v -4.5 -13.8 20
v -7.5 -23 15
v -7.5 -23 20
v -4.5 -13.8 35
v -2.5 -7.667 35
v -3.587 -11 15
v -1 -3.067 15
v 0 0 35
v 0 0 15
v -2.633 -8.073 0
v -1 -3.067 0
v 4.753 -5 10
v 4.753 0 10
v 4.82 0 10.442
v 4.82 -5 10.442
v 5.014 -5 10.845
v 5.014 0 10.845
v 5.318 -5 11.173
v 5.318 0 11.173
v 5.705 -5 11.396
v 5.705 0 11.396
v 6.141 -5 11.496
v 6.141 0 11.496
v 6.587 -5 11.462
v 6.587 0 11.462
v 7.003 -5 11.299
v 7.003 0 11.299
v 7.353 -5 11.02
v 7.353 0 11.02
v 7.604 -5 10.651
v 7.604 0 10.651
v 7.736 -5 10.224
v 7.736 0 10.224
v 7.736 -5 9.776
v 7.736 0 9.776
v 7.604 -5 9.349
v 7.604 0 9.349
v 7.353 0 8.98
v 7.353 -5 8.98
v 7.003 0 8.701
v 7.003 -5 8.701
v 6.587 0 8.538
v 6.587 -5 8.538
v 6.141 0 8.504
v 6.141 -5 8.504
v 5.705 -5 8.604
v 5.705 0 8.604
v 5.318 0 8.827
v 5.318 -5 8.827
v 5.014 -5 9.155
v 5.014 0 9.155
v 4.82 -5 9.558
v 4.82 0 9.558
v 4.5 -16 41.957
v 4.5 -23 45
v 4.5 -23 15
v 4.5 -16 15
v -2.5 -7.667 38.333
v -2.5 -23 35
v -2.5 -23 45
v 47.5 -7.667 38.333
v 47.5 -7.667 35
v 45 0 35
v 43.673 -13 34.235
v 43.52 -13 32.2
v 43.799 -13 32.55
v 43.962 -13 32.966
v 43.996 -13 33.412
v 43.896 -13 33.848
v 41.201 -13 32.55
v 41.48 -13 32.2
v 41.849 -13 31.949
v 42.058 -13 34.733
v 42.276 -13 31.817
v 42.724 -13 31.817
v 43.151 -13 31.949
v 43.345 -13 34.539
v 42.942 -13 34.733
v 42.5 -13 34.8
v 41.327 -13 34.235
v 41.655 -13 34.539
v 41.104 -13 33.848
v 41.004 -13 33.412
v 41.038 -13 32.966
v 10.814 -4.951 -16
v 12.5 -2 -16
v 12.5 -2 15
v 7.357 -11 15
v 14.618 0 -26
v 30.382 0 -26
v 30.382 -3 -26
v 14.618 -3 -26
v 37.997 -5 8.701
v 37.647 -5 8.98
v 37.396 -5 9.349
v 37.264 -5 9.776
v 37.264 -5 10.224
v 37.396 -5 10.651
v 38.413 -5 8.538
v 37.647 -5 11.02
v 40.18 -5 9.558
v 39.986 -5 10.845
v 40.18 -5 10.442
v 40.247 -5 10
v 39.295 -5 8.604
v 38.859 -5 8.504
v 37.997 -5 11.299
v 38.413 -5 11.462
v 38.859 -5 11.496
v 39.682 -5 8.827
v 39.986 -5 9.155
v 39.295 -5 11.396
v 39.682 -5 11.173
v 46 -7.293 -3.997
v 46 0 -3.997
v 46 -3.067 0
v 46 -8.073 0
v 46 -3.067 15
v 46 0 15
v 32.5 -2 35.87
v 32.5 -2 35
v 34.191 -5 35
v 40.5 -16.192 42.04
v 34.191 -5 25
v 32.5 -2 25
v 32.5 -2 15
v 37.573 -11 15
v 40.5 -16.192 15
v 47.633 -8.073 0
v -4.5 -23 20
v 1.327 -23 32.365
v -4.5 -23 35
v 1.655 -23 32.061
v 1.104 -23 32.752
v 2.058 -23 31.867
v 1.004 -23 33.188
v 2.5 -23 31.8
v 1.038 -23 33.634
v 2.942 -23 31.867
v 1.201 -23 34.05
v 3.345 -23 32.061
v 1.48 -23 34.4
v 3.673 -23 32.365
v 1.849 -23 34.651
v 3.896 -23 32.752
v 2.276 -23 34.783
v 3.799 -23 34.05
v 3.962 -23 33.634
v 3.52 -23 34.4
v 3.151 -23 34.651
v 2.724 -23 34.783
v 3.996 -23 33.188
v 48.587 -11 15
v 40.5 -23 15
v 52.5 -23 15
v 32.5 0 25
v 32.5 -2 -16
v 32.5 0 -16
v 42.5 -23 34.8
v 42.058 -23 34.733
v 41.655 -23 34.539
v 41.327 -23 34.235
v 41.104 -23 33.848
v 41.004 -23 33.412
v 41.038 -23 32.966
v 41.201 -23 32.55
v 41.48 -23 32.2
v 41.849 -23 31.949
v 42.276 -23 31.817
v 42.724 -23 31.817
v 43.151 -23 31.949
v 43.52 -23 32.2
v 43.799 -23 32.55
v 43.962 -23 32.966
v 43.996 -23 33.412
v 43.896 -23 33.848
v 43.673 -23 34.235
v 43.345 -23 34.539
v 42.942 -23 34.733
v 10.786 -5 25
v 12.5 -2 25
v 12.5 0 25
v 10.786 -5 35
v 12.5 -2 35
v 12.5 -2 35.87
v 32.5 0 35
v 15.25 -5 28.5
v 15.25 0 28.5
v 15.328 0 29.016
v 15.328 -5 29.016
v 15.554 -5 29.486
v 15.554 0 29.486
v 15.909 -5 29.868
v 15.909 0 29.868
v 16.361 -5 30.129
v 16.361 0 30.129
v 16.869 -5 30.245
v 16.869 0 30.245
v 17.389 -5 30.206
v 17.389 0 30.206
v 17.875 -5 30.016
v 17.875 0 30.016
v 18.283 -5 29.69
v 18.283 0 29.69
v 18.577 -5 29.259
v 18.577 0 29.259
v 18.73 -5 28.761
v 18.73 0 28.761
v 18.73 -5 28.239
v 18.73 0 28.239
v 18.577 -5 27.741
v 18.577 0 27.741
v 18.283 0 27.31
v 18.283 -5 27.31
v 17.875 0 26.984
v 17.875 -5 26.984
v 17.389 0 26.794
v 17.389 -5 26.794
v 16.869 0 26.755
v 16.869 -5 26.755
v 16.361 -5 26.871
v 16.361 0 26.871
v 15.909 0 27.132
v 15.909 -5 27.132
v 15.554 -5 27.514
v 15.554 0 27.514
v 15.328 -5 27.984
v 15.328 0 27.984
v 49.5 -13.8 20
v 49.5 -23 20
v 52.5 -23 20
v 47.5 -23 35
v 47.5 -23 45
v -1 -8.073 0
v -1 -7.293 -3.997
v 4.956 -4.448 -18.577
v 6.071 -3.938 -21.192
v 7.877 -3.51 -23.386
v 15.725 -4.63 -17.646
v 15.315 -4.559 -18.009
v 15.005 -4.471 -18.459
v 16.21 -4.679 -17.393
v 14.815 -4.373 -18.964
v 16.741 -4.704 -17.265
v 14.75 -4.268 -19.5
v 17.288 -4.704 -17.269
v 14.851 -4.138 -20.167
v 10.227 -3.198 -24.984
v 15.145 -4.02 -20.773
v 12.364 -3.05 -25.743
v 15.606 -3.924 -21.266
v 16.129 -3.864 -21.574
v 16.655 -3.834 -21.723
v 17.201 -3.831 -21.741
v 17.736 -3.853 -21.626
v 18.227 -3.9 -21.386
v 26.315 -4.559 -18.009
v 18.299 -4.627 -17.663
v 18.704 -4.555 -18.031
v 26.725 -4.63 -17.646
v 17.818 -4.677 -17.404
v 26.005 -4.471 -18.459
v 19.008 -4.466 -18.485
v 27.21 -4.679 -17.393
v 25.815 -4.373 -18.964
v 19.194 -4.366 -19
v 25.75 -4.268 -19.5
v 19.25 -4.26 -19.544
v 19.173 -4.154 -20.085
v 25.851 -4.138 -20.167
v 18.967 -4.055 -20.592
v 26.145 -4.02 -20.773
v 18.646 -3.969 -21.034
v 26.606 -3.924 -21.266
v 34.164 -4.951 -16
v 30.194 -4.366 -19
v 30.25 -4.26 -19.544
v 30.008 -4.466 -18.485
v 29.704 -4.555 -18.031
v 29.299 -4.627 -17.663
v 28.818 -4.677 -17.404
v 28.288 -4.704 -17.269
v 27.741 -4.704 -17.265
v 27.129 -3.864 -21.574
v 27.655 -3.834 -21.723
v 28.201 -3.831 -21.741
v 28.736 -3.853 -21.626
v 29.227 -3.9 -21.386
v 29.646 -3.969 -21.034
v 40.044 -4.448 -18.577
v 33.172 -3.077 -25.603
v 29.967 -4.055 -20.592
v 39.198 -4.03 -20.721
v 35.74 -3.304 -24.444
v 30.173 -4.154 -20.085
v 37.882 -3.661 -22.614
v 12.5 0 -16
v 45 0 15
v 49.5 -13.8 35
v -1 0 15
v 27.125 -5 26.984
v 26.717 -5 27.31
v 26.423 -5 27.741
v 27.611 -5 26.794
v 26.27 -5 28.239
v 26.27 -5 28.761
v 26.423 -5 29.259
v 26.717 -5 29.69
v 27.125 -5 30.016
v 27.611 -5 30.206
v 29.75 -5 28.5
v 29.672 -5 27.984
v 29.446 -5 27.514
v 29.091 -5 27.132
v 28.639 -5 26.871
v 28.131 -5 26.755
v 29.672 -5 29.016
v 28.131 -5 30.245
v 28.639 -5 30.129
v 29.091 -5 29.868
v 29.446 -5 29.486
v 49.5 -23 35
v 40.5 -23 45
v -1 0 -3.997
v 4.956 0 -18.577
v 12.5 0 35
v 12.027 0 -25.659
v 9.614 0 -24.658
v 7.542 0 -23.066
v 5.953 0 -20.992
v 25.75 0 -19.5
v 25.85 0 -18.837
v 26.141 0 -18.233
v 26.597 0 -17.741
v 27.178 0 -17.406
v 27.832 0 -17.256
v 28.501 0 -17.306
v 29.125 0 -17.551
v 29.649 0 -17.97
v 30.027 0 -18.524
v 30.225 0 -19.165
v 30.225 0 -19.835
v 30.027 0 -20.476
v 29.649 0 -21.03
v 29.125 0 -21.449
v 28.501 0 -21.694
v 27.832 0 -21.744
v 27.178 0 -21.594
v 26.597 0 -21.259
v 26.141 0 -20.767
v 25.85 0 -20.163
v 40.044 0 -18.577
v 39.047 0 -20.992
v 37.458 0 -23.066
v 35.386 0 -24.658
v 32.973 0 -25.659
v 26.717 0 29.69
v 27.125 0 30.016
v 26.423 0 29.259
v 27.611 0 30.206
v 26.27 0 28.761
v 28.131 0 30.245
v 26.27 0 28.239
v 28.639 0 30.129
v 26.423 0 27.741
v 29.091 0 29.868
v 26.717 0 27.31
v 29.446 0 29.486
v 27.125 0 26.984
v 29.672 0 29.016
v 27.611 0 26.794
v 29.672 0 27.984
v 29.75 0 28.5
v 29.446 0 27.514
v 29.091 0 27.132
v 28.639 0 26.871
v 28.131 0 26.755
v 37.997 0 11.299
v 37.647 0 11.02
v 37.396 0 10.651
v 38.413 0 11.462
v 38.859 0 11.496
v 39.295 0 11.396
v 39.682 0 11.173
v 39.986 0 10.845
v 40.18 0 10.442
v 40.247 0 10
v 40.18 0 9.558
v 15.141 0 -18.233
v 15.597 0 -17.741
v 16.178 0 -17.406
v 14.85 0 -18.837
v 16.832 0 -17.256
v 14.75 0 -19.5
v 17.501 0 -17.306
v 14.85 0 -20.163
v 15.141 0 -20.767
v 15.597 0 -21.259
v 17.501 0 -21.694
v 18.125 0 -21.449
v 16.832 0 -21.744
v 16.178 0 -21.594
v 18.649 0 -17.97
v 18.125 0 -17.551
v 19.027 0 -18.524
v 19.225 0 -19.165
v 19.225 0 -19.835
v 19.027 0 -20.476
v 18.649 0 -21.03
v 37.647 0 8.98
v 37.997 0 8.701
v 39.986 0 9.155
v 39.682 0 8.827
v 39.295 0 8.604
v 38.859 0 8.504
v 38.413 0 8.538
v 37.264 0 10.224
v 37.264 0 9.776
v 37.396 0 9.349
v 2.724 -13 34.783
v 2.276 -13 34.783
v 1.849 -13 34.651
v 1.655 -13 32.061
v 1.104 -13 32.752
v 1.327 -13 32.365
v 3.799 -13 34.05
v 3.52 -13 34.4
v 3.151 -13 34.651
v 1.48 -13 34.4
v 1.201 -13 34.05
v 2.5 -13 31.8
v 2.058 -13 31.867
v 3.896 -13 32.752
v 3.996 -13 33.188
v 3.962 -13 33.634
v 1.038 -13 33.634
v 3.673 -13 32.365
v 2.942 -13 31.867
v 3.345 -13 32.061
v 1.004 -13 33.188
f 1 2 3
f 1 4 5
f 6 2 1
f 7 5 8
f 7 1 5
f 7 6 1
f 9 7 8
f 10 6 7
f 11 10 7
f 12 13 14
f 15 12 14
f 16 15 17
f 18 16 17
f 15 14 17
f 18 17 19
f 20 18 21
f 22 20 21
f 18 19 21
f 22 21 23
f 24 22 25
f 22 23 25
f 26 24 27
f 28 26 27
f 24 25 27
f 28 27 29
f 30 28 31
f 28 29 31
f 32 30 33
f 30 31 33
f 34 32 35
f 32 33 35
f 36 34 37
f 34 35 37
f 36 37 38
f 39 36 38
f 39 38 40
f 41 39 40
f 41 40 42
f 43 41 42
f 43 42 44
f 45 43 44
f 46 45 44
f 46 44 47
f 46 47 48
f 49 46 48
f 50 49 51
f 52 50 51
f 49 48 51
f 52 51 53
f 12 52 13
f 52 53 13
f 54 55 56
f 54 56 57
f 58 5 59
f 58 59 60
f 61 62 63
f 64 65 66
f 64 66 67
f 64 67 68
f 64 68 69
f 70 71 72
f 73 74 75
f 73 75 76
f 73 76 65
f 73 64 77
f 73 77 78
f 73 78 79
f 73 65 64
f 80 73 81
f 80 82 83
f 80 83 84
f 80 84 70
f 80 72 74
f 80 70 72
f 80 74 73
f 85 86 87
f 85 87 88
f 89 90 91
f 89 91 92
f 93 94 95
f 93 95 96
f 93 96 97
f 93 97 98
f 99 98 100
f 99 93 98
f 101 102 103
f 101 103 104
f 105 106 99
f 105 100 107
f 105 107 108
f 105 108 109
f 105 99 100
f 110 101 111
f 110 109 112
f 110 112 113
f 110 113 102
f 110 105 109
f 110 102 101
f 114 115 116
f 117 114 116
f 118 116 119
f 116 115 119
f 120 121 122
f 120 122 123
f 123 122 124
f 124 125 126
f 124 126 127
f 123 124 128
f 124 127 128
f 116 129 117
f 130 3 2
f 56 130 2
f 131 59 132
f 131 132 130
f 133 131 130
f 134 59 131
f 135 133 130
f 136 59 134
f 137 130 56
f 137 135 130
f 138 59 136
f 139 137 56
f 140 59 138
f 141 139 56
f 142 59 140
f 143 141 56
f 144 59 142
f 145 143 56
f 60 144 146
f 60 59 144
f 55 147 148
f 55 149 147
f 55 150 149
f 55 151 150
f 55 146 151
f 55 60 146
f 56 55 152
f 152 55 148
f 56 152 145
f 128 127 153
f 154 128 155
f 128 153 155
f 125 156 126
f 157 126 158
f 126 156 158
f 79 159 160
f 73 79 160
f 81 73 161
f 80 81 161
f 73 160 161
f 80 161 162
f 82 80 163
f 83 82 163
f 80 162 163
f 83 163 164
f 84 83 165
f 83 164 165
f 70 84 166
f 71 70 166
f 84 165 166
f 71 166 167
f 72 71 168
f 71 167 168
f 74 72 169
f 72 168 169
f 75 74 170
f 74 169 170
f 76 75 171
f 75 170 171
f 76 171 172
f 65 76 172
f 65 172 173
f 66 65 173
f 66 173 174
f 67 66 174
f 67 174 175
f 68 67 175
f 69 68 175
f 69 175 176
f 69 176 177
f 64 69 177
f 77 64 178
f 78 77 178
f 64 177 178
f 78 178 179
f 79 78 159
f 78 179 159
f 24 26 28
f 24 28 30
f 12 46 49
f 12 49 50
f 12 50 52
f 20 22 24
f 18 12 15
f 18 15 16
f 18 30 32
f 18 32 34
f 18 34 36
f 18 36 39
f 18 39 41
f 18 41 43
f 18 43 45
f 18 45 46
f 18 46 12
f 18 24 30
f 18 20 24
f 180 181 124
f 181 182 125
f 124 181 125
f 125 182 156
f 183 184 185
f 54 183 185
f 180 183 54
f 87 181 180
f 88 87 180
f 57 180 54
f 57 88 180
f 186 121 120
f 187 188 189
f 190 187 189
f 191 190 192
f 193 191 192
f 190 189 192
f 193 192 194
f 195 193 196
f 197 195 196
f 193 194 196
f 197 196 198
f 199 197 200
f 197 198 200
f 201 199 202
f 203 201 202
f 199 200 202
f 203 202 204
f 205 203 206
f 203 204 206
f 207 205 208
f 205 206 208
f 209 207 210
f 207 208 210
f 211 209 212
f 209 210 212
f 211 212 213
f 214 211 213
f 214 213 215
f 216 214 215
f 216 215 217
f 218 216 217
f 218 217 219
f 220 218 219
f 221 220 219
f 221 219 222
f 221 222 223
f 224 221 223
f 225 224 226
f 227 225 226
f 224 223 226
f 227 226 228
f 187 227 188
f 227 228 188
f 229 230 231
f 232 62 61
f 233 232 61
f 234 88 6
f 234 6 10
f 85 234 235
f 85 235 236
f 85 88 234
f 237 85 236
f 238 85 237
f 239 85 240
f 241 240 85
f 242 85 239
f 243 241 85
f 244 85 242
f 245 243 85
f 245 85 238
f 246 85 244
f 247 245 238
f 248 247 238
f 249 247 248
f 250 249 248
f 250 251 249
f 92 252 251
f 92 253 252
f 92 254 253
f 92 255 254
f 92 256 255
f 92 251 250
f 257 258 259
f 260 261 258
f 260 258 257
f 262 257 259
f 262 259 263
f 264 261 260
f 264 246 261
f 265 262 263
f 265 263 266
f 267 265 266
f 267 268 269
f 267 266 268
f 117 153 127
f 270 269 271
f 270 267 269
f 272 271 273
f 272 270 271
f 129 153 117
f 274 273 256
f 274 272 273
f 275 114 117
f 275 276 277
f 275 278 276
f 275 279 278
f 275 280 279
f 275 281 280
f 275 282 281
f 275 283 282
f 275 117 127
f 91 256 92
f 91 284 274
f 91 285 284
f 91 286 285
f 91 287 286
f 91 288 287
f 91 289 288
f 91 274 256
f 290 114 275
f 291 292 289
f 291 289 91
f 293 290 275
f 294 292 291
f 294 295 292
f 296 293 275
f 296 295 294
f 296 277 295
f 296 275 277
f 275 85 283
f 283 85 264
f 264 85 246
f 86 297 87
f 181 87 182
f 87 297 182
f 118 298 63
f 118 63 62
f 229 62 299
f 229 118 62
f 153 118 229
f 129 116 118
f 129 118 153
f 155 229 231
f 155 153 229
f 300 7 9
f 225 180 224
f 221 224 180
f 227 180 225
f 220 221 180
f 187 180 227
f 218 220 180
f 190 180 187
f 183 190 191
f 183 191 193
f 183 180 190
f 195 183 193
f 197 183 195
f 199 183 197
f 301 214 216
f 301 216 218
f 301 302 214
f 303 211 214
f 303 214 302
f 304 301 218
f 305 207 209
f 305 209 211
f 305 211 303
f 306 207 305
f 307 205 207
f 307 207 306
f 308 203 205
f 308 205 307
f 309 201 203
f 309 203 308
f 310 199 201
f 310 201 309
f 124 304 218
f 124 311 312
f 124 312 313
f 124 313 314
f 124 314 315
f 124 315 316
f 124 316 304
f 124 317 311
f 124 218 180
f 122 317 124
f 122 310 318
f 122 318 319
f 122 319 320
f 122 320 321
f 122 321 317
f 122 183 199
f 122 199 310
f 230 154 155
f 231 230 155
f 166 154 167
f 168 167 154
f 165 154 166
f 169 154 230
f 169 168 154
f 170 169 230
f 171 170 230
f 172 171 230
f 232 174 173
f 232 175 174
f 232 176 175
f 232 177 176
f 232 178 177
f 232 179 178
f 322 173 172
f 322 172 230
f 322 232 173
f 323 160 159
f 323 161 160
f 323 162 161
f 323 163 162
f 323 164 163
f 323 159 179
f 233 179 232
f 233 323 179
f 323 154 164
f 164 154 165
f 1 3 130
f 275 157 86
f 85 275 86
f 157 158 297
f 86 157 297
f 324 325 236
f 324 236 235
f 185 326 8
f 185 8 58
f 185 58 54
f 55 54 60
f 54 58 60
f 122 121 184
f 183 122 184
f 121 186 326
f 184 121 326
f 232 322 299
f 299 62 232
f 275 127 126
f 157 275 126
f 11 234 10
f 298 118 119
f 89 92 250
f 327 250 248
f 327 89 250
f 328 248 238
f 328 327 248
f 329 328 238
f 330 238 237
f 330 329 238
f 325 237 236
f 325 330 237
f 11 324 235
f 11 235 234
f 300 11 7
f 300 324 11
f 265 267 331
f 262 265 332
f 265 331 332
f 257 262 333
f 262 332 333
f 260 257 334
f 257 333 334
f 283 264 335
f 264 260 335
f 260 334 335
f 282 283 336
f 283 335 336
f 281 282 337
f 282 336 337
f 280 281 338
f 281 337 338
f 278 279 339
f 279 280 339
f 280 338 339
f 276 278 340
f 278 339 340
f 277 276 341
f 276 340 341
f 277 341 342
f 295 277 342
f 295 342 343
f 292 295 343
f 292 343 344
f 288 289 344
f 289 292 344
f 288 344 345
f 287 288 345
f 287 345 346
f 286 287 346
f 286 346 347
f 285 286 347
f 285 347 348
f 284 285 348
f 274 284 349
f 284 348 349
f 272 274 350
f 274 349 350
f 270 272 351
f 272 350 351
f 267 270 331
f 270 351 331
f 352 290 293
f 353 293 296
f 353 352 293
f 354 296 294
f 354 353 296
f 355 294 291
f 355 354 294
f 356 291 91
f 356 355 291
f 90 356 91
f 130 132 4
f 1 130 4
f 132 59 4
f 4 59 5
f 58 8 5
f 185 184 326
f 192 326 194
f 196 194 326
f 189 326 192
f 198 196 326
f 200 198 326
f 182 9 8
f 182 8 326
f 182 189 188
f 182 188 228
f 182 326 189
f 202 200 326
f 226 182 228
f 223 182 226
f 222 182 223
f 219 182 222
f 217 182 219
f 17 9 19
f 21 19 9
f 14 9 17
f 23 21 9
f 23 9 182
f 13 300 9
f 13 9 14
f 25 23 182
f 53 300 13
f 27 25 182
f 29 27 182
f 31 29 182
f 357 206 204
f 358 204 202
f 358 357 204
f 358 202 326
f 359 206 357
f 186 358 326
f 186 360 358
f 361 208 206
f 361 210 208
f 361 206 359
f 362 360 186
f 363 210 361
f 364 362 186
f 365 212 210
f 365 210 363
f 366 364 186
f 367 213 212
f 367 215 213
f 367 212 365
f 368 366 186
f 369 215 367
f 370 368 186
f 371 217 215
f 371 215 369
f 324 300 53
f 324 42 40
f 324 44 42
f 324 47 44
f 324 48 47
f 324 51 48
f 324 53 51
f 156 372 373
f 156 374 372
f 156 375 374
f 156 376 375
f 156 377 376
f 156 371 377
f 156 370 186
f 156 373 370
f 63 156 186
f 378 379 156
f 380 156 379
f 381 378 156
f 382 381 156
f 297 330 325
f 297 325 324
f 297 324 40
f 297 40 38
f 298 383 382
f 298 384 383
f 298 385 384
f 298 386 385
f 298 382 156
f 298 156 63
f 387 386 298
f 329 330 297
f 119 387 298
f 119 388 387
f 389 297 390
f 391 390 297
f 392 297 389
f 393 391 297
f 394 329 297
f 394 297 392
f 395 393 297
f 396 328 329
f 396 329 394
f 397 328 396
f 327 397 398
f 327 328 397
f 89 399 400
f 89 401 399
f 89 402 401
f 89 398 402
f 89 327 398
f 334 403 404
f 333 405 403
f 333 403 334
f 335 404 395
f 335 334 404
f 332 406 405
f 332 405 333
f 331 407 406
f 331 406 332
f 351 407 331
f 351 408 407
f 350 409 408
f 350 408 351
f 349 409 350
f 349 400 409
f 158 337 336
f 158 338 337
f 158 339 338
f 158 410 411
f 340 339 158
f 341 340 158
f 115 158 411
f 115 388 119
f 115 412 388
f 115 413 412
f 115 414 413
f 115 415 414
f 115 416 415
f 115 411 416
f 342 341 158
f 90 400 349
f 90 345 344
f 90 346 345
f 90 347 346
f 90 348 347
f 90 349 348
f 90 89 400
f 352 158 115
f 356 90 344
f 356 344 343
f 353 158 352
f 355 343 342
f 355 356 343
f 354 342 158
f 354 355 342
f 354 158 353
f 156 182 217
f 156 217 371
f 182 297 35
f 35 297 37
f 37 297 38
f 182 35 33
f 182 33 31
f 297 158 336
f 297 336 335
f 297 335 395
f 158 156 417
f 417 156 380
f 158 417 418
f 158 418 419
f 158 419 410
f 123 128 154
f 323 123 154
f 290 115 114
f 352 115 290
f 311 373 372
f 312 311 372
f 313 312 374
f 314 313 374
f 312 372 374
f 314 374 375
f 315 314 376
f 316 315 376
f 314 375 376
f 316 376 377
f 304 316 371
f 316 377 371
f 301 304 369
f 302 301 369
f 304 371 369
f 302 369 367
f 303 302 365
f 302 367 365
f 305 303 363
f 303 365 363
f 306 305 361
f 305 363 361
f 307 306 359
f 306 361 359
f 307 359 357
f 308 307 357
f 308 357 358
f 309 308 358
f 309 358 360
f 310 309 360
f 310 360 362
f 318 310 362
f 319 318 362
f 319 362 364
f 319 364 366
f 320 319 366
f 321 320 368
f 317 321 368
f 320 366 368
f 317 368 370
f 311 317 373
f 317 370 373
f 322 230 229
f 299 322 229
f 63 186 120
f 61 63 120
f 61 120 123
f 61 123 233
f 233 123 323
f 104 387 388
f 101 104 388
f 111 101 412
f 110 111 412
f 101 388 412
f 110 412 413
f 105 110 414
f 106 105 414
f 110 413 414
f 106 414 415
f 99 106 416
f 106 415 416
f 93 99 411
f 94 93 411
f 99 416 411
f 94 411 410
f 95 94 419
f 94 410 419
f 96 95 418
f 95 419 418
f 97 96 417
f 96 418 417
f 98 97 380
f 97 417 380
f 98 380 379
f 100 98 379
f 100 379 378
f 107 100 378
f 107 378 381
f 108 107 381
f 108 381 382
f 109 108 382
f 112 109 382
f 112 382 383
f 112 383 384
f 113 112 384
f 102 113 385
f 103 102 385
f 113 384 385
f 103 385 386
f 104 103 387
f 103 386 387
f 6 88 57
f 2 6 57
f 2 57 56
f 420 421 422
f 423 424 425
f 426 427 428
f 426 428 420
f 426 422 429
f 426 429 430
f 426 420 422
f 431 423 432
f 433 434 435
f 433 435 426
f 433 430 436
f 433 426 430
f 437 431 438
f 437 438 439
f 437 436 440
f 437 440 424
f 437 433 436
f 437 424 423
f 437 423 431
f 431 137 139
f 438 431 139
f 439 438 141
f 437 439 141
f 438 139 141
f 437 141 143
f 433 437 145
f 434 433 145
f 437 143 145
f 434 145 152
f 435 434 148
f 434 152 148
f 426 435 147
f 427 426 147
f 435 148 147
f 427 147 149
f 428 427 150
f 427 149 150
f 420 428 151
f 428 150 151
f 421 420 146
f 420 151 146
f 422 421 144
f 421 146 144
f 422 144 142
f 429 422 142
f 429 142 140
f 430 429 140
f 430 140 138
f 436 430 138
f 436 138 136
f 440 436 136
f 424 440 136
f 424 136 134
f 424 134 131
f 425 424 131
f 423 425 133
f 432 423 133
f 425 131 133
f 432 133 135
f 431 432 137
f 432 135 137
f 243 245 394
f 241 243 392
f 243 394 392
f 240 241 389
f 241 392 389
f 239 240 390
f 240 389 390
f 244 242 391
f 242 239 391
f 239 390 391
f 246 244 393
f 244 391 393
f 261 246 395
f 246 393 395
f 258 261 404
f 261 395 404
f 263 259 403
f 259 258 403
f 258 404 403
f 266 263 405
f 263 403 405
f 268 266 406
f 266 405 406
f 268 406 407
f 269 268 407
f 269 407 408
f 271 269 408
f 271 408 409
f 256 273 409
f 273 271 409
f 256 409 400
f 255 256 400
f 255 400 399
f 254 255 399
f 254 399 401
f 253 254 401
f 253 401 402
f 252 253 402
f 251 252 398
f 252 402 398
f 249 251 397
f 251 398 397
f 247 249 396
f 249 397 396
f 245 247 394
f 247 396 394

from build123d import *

# Parameters (mm, degrees)
SALIENTE_EXTRUIR1_DEPTH = 35
CROQUIS6_R              = 2.25
CROQUIS6_W              = 20
CROQUIS6_H              = 25
CORTAR_EXTRUIR3_DEPTH   = 10
CROQUIS7_R              = 2.25
SALIENTE_EXTRUIR4_DEPTH = 15
CROQUIS8_R              = 1.5
CORTAR_EXTRUIR4_DEPTH   = 10
CORTAR_EXTRUIR8_DEPTH   = 50
CORTAR_EXTRUIR11_REACH  = 69.158
CORTAR_EXTRUIR12_DEPTH  = 16
CROQUIS13_W             = 6.081292266
CROQUIS13_H             = 9.753773429
CORTAR_EXTRUIR13_DEPTH  = 15
CORTAR_EXTRUIR14_DEPTH  = 63.5
CORTAR_EXTRUIR15_DEPTH  = 100
SALIENTE_EXTRUIR5_REACH = 69.158
CROQUIS16_W             = 15
CROQUIS16_H             = 10
CORTAR_EXTRUIR16_DEPTH  = 200
CORTAR_EXTRUIR17_DEPTH  = 200
SALIENTE_EXTRUIR7_DEPTH = 23.5
CROQUIS22_R             = 2.25
CORTAR_EXTRUIR19_DEPTH  = 47
CORTAR_EXTRUIR20_DEPTH  = 31
CROQUIS24_W             = 29.420485752
CROQUIS24_H             = 5
SALIENTE_EXTRUIR9_DEPTH = 10
CROQUIS25_R             = 1.75
CROQUIS25_R_2           = 1.5
CORTAR_EXTRUIR21_DEPTH  = 5


with BuildPart() as part:
    # Croquis1 → Saliente-Extruir1 (new body)
    with BuildSketch(Plane.XY):
        Polygon((0, 0), (45, 0), (52.5, -23), (40.5, -23), (40.5, -16.192411456), (32.5, -2), (12.5, -2), (4.5, -16), (4.5, -23), (-7.5, -23), align=None)
    extrude(amount=SALIENTE_EXTRUIR1_DEPTH)

    # Croquis6 → Cortar-Extruir3 (cut)
    with BuildSketch(Plane(origin=(0, 0, 0), x_dir=(1, 0, 0), z_dir=(0, 1, 0))):
        with Locations(Location((17, -28.5, 0), (0, 0, 180))):
            Circle(CROQUIS6_R)
        with Locations(Location((28, -28.5, 0), (0, 0, 270))):
            Circle(CROQUIS6_R)
        with Locations((22.5, -12.5)):
            Rectangle(CROQUIS6_W, CROQUIS6_H)
    extrude(amount=-CORTAR_EXTRUIR3_DEPTH, mode=Mode.SUBTRACT)

    # Croquis8 → Cortar-Extruir4 (cut)
    with BuildSketch(Plane(origin=(0, -23, 0), x_dir=(-1, 0, 0), z_dir=(0, -1, 0))):
        with Locations(Location((-2.5, -33.3, 0), (0, 0, 90))):
            Circle(CROQUIS8_R)
        with Locations(Location((-42.5, -33.3, 0), (0, 0, 270))):
            Circle(CROQUIS8_R)
    extrude(amount=-CORTAR_EXTRUIR4_DEPTH, mode=Mode.SUBTRACT)

    # Cortar-Extruir11: up to this plane
    cortar_extruir11_end = Plane(origin=(50, -15, 0), z_dir=(0, -0.9079593845004518, -0.41905817746174695))
    # Croquis11 → Cortar-Extruir11 (cut, up to the surface)
    with BuildSketch(Plane.XZ.offset(23), mode=Mode.PRIVATE) as cortar_extruir11_sk1:
        with BuildLine():
            Line((-7.5, 15), (-7.5, -3.030649644))
            Line((-7.5, -3.030649644), (52.5, -3.030649644))
            Line((52.5, -3.030649644), (52.5, 15))
            ThreePointArc((52.5, 15), (22.5, 5.553378231), (-7.5, 15))
        make_face()
    cortar_extruir11_tool1 = split(extrude(cortar_extruir11_sk1.sketch, amount=-CORTAR_EXTRUIR11_REACH, mode=Mode.PRIVATE), bisect_by=cortar_extruir11_end, keep=Keep.BOTH, mode=Mode.PRIVATE)
    add(cortar_extruir11_tool1.solids().sort_by_distance((22.5, -23, 3.105508))[0], mode=Mode.SUBTRACT)

    # Croquis13 → Cortar-Extruir13 (cut)
    with BuildSketch(Plane.XY.offset(35)):
        with Locations((-7.540646133, -18.123113286)):
            Rectangle(CROQUIS13_W, CROQUIS13_H)
        with Locations((52.540646133, -18.123113286)):
            Rectangle(CROQUIS13_W, CROQUIS13_H)
    extrude(amount=-CORTAR_EXTRUIR13_DEPTH, mode=Mode.SUBTRACT)

    # Croquis14 → Cortar-Extruir14 (cut, symmetric)
    with BuildSketch(Plane(origin=(0, 0, 0), x_dir=(0, 0, -1), z_dir=(1, 0, 0))):
        Polygon((-15, -11), (-15, -28.858785619), (26, -23), (26, -3), align=None)
    extrude(amount=CORTAR_EXTRUIR14_DEPTH, both=True, mode=Mode.SUBTRACT)

    # Saliente-Extruir5: up to this face of the body (flat: up to its plane)
    saliente_extruir5_end = Plane(part.part.faces().sort_by_distance((6.25, 0, 0.570087713))[0])
    # Croquis16 → Saliente-Extruir5 (add, up to the picked face)
    with BuildSketch(Plane.XZ.offset(23), mode=Mode.PRIVATE) as saliente_extruir5_sk1:
        with Locations((5, 40)):
            Rectangle(CROQUIS16_W, CROQUIS16_H)
    saliente_extruir5_tool1 = split(extrude(saliente_extruir5_sk1.sketch, amount=-SALIENTE_EXTRUIR5_REACH, mode=Mode.PRIVATE), bisect_by=saliente_extruir5_end, keep=Keep.BOTH, mode=Mode.PRIVATE)
    # Croquis16 → Saliente-Extruir5 (add, up to the picked face)
    with BuildSketch(Plane.XZ.offset(23), mode=Mode.PRIVATE) as saliente_extruir5_sk2:
        with Locations((40, 40)):
            Rectangle(CROQUIS16_W, CROQUIS16_H)
    saliente_extruir5_tool2 = split(extrude(saliente_extruir5_sk2.sketch, amount=-SALIENTE_EXTRUIR5_REACH, mode=Mode.PRIVATE), bisect_by=saliente_extruir5_end, keep=Keep.BOTH, mode=Mode.PRIVATE)
    add(saliente_extruir5_tool1.solids().sort_by(Axis((5, -23, 40), (0, 1, 0)))[0])
    add(saliente_extruir5_tool2.solids().sort_by(Axis((40, -23, 40), (0, 1, 0)))[0])

    # Croquis17 → Cortar-Extruir16 (cut)
    with BuildSketch(Plane.ZY.offset(2.5)):
        Polygon((35, 0), (45, -23), (45, 0), align=None)
    extrude(amount=-CORTAR_EXTRUIR16_DEPTH, mode=Mode.SUBTRACT)

    # Croquis18 → Cortar-Extruir17 (cut)
    with BuildSketch(Plane(origin=(0, 0, 35), x_dir=(-1, 0, 0), z_dir=(0, 0, -1))):
        Polygon((-32.5, -2), (-40.5, -16.192411456), (-40.5, -23), (-32.5, -23), align=None)
        Polygon((-12.5, -23), (-4.5, -23), (-4.5, -16), (-12.5, -2), align=None)
        Polygon((-47.5, -7.666666667), (-45, 0), (-47.5, 0), align=None)
        Polygon((2.5, 0), (0, 0), (2.5, -7.666666667), align=None)
    extrude(amount=-CORTAR_EXTRUIR17_DEPTH, mode=Mode.SUBTRACT)



with BuildPart() as body_2:
    # Croquis7 → Saliente-Extruir4 (new body)
    with BuildSketch(Plane(origin=(0, 0, 0), x_dir=(1, 0, 0), z_dir=(0, 1, 0))):
        with BuildLine():
            Line((12.5, 16), (32.5, 16))
            Line((32.5, 16), (32.5, 0))
            Line((32.5, 0), (45, 0))
            Line((45, 0), (40.044296858, 18.577458823))
            ThreePointArc((40.044296858, 18.577458823), (36.474189304, 23.930150952), (30.382169451, 26))
            Line((30.382169451, 26), (14.617830549, 26))
            ThreePointArc((14.617830549, 26), (8.525810696, 23.930150952), (4.955703142, 18.577458823))
            Line((4.955703142, 18.577458823), (0, 0))
            Line((0, 0), (12.5, 0))
            Line((12.5, 0), (12.5, 16))
        make_face()
        with Locations((28, 19.5)):
            Circle(CROQUIS7_R, mode=Mode.SUBTRACT)
        with Locations((17, 19.5)):
            Circle(CROQUIS7_R, mode=Mode.SUBTRACT)
    extrude(amount=-SALIENTE_EXTRUIR4_DEPTH)

    # Croquis10 → Cortar-Extruir8 (cut)
    with BuildSketch(Plane(origin=(0, 0, 0), x_dir=(0, 0, -1), z_dir=(1, 0, 0))):
        Polygon((0, -15), (26, -3), (26, 0), (28.244981963, 0), (28.244981963, -21.856093693), align=None)
    extrude(amount=CORTAR_EXTRUIR8_DEPTH, mode=Mode.SUBTRACT)

    # Croquis12 → Cortar-Extruir12 (cut)
    with BuildSketch(Plane.XY):
        Polygon((12.5, -2), (12.5, -7.5), (12.5, -22.325980529), (0.885153984, -22.325980529), align=None)
        Polygon((44.114846016, -22.325980529), (32.5, -22.325980529), (32.5, -7.5), (32.5, -2), align=None)
    extrude(amount=-CORTAR_EXTRUIR12_DEPTH, mode=Mode.SUBTRACT)

    # Croquis15 → Cortar-Extruir15 (cut, symmetric)
    with BuildSketch(Plane(origin=(0, 0, 0), x_dir=(0, 0, -1), z_dir=(1, 0, 0))):
        Polygon((-15, -23), (-15, -11), (26, -3), align=None)
    extrude(amount=CORTAR_EXTRUIR15_DEPTH, both=True, mode=Mode.SUBTRACT)


with BuildPart() as part_1:
    add(part.part)

    add(body_2.part)  # Saliente-Extruir7 merges body 2
    # Croquis20 → Saliente-Extruir7 (add, symmetric)
    with BuildSketch(Plane(origin=(22.5, 0, 0), x_dir=(0, 0, -1), z_dir=(1, 0, 0))):
        Polygon((-15, -11), (-15, 0), (26, 0), (26, -3), align=None)
    extrude(amount=SALIENTE_EXTRUIR7_DEPTH, both=True)

    # Croquis22 → Cortar-Extruir19 (cut)
    with BuildSketch(Plane(origin=(0, 0, 0), x_dir=(1, 0, 0), z_dir=(0, 1, 0))):
        with Locations(Location((17, 19.5, 0), (0, 0, 180))):
            Circle(CROQUIS22_R)
        with Locations(Location((28, 19.5, 0), (0, 0, 180))):
            Circle(CROQUIS22_R)
        Polygon((12.5, 0), (12.5, -25), (32.5, -25), (32.5, 0), (32.5, 16), (12.5, 16), align=None)
        with BuildLine():
            Line((4.955703142, 18.577458823), (-2.632555673, 0))
            Line((-2.632555673, 0), (-11.688532454, 0))
            Line((-11.688532454, 0), (-11.688532454, 31.257495622))
            Line((-11.688532454, 31.257495622), (0, 31.257495622))
            Line((0, 31.257495622), (45, 31.257495622))
            Line((45, 31.257495622), (54.896993635, 31.257495622))
            Line((54.896993635, 31.257495622), (58.873924375, 0))
            Line((58.873924375, 0), (47.632555673, 0))
            Line((47.632555673, 0), (40.044296858, 18.577458823))
            ThreePointArc((40.044296858, 18.577458823), (36.474189304, 23.930150952), (30.382169451, 26))
            Line((30.382169451, 26), (14.617830549, 26))
            ThreePointArc((14.617830549, 26), (8.525810696, 23.930150952), (4.955703142, 18.577458823))
        make_face()
    extrude(amount=-CORTAR_EXTRUIR19_DEPTH, mode=Mode.SUBTRACT)

    # Croquis23 → Cortar-Extruir20 (cut)
    with BuildSketch(Plane.XY.offset(15)):
        Polygon((7.357142857, -11), (12.5, -11), (12.5, -2), align=None)
        Polygon((37.573133641, -11), (32.5, -2), (32.5, -11), align=None)
    extrude(amount=-CORTAR_EXTRUIR20_DEPTH, mode=Mode.SUBTRACT)

    # Croquis24 → Saliente-Extruir9 (add)
    with BuildSketch(Plane.XY.offset(35)):
        with Locations((22.884581513, -2.5)):
            Rectangle(CROQUIS24_W, CROQUIS24_H)
    extrude(amount=-SALIENTE_EXTRUIR9_DEPTH)

    # Croquis25 → Cortar-Extruir21 (cut)
    with BuildSketch(Plane(origin=(0, 0, 0), x_dir=(1, 0, 0), z_dir=(0, 1, 0))):
        with Locations(Location((17, -28.5, 0), (0, 0, 180))):
            Circle(CROQUIS25_R)
        with Locations((28, -28.5)):
            Circle(CROQUIS25_R)
        with Locations(Location((6.253029256, -10.000000184, 0), (0, 0, 180))):
            Circle(CROQUIS25_R_2)
        with Locations((38.746970744, -10.000000184)):
            Circle(CROQUIS25_R_2)
    extrude(amount=-CORTAR_EXTRUIR21_DEPTH, mode=Mode.SUBTRACT)


solid = part_1.part
